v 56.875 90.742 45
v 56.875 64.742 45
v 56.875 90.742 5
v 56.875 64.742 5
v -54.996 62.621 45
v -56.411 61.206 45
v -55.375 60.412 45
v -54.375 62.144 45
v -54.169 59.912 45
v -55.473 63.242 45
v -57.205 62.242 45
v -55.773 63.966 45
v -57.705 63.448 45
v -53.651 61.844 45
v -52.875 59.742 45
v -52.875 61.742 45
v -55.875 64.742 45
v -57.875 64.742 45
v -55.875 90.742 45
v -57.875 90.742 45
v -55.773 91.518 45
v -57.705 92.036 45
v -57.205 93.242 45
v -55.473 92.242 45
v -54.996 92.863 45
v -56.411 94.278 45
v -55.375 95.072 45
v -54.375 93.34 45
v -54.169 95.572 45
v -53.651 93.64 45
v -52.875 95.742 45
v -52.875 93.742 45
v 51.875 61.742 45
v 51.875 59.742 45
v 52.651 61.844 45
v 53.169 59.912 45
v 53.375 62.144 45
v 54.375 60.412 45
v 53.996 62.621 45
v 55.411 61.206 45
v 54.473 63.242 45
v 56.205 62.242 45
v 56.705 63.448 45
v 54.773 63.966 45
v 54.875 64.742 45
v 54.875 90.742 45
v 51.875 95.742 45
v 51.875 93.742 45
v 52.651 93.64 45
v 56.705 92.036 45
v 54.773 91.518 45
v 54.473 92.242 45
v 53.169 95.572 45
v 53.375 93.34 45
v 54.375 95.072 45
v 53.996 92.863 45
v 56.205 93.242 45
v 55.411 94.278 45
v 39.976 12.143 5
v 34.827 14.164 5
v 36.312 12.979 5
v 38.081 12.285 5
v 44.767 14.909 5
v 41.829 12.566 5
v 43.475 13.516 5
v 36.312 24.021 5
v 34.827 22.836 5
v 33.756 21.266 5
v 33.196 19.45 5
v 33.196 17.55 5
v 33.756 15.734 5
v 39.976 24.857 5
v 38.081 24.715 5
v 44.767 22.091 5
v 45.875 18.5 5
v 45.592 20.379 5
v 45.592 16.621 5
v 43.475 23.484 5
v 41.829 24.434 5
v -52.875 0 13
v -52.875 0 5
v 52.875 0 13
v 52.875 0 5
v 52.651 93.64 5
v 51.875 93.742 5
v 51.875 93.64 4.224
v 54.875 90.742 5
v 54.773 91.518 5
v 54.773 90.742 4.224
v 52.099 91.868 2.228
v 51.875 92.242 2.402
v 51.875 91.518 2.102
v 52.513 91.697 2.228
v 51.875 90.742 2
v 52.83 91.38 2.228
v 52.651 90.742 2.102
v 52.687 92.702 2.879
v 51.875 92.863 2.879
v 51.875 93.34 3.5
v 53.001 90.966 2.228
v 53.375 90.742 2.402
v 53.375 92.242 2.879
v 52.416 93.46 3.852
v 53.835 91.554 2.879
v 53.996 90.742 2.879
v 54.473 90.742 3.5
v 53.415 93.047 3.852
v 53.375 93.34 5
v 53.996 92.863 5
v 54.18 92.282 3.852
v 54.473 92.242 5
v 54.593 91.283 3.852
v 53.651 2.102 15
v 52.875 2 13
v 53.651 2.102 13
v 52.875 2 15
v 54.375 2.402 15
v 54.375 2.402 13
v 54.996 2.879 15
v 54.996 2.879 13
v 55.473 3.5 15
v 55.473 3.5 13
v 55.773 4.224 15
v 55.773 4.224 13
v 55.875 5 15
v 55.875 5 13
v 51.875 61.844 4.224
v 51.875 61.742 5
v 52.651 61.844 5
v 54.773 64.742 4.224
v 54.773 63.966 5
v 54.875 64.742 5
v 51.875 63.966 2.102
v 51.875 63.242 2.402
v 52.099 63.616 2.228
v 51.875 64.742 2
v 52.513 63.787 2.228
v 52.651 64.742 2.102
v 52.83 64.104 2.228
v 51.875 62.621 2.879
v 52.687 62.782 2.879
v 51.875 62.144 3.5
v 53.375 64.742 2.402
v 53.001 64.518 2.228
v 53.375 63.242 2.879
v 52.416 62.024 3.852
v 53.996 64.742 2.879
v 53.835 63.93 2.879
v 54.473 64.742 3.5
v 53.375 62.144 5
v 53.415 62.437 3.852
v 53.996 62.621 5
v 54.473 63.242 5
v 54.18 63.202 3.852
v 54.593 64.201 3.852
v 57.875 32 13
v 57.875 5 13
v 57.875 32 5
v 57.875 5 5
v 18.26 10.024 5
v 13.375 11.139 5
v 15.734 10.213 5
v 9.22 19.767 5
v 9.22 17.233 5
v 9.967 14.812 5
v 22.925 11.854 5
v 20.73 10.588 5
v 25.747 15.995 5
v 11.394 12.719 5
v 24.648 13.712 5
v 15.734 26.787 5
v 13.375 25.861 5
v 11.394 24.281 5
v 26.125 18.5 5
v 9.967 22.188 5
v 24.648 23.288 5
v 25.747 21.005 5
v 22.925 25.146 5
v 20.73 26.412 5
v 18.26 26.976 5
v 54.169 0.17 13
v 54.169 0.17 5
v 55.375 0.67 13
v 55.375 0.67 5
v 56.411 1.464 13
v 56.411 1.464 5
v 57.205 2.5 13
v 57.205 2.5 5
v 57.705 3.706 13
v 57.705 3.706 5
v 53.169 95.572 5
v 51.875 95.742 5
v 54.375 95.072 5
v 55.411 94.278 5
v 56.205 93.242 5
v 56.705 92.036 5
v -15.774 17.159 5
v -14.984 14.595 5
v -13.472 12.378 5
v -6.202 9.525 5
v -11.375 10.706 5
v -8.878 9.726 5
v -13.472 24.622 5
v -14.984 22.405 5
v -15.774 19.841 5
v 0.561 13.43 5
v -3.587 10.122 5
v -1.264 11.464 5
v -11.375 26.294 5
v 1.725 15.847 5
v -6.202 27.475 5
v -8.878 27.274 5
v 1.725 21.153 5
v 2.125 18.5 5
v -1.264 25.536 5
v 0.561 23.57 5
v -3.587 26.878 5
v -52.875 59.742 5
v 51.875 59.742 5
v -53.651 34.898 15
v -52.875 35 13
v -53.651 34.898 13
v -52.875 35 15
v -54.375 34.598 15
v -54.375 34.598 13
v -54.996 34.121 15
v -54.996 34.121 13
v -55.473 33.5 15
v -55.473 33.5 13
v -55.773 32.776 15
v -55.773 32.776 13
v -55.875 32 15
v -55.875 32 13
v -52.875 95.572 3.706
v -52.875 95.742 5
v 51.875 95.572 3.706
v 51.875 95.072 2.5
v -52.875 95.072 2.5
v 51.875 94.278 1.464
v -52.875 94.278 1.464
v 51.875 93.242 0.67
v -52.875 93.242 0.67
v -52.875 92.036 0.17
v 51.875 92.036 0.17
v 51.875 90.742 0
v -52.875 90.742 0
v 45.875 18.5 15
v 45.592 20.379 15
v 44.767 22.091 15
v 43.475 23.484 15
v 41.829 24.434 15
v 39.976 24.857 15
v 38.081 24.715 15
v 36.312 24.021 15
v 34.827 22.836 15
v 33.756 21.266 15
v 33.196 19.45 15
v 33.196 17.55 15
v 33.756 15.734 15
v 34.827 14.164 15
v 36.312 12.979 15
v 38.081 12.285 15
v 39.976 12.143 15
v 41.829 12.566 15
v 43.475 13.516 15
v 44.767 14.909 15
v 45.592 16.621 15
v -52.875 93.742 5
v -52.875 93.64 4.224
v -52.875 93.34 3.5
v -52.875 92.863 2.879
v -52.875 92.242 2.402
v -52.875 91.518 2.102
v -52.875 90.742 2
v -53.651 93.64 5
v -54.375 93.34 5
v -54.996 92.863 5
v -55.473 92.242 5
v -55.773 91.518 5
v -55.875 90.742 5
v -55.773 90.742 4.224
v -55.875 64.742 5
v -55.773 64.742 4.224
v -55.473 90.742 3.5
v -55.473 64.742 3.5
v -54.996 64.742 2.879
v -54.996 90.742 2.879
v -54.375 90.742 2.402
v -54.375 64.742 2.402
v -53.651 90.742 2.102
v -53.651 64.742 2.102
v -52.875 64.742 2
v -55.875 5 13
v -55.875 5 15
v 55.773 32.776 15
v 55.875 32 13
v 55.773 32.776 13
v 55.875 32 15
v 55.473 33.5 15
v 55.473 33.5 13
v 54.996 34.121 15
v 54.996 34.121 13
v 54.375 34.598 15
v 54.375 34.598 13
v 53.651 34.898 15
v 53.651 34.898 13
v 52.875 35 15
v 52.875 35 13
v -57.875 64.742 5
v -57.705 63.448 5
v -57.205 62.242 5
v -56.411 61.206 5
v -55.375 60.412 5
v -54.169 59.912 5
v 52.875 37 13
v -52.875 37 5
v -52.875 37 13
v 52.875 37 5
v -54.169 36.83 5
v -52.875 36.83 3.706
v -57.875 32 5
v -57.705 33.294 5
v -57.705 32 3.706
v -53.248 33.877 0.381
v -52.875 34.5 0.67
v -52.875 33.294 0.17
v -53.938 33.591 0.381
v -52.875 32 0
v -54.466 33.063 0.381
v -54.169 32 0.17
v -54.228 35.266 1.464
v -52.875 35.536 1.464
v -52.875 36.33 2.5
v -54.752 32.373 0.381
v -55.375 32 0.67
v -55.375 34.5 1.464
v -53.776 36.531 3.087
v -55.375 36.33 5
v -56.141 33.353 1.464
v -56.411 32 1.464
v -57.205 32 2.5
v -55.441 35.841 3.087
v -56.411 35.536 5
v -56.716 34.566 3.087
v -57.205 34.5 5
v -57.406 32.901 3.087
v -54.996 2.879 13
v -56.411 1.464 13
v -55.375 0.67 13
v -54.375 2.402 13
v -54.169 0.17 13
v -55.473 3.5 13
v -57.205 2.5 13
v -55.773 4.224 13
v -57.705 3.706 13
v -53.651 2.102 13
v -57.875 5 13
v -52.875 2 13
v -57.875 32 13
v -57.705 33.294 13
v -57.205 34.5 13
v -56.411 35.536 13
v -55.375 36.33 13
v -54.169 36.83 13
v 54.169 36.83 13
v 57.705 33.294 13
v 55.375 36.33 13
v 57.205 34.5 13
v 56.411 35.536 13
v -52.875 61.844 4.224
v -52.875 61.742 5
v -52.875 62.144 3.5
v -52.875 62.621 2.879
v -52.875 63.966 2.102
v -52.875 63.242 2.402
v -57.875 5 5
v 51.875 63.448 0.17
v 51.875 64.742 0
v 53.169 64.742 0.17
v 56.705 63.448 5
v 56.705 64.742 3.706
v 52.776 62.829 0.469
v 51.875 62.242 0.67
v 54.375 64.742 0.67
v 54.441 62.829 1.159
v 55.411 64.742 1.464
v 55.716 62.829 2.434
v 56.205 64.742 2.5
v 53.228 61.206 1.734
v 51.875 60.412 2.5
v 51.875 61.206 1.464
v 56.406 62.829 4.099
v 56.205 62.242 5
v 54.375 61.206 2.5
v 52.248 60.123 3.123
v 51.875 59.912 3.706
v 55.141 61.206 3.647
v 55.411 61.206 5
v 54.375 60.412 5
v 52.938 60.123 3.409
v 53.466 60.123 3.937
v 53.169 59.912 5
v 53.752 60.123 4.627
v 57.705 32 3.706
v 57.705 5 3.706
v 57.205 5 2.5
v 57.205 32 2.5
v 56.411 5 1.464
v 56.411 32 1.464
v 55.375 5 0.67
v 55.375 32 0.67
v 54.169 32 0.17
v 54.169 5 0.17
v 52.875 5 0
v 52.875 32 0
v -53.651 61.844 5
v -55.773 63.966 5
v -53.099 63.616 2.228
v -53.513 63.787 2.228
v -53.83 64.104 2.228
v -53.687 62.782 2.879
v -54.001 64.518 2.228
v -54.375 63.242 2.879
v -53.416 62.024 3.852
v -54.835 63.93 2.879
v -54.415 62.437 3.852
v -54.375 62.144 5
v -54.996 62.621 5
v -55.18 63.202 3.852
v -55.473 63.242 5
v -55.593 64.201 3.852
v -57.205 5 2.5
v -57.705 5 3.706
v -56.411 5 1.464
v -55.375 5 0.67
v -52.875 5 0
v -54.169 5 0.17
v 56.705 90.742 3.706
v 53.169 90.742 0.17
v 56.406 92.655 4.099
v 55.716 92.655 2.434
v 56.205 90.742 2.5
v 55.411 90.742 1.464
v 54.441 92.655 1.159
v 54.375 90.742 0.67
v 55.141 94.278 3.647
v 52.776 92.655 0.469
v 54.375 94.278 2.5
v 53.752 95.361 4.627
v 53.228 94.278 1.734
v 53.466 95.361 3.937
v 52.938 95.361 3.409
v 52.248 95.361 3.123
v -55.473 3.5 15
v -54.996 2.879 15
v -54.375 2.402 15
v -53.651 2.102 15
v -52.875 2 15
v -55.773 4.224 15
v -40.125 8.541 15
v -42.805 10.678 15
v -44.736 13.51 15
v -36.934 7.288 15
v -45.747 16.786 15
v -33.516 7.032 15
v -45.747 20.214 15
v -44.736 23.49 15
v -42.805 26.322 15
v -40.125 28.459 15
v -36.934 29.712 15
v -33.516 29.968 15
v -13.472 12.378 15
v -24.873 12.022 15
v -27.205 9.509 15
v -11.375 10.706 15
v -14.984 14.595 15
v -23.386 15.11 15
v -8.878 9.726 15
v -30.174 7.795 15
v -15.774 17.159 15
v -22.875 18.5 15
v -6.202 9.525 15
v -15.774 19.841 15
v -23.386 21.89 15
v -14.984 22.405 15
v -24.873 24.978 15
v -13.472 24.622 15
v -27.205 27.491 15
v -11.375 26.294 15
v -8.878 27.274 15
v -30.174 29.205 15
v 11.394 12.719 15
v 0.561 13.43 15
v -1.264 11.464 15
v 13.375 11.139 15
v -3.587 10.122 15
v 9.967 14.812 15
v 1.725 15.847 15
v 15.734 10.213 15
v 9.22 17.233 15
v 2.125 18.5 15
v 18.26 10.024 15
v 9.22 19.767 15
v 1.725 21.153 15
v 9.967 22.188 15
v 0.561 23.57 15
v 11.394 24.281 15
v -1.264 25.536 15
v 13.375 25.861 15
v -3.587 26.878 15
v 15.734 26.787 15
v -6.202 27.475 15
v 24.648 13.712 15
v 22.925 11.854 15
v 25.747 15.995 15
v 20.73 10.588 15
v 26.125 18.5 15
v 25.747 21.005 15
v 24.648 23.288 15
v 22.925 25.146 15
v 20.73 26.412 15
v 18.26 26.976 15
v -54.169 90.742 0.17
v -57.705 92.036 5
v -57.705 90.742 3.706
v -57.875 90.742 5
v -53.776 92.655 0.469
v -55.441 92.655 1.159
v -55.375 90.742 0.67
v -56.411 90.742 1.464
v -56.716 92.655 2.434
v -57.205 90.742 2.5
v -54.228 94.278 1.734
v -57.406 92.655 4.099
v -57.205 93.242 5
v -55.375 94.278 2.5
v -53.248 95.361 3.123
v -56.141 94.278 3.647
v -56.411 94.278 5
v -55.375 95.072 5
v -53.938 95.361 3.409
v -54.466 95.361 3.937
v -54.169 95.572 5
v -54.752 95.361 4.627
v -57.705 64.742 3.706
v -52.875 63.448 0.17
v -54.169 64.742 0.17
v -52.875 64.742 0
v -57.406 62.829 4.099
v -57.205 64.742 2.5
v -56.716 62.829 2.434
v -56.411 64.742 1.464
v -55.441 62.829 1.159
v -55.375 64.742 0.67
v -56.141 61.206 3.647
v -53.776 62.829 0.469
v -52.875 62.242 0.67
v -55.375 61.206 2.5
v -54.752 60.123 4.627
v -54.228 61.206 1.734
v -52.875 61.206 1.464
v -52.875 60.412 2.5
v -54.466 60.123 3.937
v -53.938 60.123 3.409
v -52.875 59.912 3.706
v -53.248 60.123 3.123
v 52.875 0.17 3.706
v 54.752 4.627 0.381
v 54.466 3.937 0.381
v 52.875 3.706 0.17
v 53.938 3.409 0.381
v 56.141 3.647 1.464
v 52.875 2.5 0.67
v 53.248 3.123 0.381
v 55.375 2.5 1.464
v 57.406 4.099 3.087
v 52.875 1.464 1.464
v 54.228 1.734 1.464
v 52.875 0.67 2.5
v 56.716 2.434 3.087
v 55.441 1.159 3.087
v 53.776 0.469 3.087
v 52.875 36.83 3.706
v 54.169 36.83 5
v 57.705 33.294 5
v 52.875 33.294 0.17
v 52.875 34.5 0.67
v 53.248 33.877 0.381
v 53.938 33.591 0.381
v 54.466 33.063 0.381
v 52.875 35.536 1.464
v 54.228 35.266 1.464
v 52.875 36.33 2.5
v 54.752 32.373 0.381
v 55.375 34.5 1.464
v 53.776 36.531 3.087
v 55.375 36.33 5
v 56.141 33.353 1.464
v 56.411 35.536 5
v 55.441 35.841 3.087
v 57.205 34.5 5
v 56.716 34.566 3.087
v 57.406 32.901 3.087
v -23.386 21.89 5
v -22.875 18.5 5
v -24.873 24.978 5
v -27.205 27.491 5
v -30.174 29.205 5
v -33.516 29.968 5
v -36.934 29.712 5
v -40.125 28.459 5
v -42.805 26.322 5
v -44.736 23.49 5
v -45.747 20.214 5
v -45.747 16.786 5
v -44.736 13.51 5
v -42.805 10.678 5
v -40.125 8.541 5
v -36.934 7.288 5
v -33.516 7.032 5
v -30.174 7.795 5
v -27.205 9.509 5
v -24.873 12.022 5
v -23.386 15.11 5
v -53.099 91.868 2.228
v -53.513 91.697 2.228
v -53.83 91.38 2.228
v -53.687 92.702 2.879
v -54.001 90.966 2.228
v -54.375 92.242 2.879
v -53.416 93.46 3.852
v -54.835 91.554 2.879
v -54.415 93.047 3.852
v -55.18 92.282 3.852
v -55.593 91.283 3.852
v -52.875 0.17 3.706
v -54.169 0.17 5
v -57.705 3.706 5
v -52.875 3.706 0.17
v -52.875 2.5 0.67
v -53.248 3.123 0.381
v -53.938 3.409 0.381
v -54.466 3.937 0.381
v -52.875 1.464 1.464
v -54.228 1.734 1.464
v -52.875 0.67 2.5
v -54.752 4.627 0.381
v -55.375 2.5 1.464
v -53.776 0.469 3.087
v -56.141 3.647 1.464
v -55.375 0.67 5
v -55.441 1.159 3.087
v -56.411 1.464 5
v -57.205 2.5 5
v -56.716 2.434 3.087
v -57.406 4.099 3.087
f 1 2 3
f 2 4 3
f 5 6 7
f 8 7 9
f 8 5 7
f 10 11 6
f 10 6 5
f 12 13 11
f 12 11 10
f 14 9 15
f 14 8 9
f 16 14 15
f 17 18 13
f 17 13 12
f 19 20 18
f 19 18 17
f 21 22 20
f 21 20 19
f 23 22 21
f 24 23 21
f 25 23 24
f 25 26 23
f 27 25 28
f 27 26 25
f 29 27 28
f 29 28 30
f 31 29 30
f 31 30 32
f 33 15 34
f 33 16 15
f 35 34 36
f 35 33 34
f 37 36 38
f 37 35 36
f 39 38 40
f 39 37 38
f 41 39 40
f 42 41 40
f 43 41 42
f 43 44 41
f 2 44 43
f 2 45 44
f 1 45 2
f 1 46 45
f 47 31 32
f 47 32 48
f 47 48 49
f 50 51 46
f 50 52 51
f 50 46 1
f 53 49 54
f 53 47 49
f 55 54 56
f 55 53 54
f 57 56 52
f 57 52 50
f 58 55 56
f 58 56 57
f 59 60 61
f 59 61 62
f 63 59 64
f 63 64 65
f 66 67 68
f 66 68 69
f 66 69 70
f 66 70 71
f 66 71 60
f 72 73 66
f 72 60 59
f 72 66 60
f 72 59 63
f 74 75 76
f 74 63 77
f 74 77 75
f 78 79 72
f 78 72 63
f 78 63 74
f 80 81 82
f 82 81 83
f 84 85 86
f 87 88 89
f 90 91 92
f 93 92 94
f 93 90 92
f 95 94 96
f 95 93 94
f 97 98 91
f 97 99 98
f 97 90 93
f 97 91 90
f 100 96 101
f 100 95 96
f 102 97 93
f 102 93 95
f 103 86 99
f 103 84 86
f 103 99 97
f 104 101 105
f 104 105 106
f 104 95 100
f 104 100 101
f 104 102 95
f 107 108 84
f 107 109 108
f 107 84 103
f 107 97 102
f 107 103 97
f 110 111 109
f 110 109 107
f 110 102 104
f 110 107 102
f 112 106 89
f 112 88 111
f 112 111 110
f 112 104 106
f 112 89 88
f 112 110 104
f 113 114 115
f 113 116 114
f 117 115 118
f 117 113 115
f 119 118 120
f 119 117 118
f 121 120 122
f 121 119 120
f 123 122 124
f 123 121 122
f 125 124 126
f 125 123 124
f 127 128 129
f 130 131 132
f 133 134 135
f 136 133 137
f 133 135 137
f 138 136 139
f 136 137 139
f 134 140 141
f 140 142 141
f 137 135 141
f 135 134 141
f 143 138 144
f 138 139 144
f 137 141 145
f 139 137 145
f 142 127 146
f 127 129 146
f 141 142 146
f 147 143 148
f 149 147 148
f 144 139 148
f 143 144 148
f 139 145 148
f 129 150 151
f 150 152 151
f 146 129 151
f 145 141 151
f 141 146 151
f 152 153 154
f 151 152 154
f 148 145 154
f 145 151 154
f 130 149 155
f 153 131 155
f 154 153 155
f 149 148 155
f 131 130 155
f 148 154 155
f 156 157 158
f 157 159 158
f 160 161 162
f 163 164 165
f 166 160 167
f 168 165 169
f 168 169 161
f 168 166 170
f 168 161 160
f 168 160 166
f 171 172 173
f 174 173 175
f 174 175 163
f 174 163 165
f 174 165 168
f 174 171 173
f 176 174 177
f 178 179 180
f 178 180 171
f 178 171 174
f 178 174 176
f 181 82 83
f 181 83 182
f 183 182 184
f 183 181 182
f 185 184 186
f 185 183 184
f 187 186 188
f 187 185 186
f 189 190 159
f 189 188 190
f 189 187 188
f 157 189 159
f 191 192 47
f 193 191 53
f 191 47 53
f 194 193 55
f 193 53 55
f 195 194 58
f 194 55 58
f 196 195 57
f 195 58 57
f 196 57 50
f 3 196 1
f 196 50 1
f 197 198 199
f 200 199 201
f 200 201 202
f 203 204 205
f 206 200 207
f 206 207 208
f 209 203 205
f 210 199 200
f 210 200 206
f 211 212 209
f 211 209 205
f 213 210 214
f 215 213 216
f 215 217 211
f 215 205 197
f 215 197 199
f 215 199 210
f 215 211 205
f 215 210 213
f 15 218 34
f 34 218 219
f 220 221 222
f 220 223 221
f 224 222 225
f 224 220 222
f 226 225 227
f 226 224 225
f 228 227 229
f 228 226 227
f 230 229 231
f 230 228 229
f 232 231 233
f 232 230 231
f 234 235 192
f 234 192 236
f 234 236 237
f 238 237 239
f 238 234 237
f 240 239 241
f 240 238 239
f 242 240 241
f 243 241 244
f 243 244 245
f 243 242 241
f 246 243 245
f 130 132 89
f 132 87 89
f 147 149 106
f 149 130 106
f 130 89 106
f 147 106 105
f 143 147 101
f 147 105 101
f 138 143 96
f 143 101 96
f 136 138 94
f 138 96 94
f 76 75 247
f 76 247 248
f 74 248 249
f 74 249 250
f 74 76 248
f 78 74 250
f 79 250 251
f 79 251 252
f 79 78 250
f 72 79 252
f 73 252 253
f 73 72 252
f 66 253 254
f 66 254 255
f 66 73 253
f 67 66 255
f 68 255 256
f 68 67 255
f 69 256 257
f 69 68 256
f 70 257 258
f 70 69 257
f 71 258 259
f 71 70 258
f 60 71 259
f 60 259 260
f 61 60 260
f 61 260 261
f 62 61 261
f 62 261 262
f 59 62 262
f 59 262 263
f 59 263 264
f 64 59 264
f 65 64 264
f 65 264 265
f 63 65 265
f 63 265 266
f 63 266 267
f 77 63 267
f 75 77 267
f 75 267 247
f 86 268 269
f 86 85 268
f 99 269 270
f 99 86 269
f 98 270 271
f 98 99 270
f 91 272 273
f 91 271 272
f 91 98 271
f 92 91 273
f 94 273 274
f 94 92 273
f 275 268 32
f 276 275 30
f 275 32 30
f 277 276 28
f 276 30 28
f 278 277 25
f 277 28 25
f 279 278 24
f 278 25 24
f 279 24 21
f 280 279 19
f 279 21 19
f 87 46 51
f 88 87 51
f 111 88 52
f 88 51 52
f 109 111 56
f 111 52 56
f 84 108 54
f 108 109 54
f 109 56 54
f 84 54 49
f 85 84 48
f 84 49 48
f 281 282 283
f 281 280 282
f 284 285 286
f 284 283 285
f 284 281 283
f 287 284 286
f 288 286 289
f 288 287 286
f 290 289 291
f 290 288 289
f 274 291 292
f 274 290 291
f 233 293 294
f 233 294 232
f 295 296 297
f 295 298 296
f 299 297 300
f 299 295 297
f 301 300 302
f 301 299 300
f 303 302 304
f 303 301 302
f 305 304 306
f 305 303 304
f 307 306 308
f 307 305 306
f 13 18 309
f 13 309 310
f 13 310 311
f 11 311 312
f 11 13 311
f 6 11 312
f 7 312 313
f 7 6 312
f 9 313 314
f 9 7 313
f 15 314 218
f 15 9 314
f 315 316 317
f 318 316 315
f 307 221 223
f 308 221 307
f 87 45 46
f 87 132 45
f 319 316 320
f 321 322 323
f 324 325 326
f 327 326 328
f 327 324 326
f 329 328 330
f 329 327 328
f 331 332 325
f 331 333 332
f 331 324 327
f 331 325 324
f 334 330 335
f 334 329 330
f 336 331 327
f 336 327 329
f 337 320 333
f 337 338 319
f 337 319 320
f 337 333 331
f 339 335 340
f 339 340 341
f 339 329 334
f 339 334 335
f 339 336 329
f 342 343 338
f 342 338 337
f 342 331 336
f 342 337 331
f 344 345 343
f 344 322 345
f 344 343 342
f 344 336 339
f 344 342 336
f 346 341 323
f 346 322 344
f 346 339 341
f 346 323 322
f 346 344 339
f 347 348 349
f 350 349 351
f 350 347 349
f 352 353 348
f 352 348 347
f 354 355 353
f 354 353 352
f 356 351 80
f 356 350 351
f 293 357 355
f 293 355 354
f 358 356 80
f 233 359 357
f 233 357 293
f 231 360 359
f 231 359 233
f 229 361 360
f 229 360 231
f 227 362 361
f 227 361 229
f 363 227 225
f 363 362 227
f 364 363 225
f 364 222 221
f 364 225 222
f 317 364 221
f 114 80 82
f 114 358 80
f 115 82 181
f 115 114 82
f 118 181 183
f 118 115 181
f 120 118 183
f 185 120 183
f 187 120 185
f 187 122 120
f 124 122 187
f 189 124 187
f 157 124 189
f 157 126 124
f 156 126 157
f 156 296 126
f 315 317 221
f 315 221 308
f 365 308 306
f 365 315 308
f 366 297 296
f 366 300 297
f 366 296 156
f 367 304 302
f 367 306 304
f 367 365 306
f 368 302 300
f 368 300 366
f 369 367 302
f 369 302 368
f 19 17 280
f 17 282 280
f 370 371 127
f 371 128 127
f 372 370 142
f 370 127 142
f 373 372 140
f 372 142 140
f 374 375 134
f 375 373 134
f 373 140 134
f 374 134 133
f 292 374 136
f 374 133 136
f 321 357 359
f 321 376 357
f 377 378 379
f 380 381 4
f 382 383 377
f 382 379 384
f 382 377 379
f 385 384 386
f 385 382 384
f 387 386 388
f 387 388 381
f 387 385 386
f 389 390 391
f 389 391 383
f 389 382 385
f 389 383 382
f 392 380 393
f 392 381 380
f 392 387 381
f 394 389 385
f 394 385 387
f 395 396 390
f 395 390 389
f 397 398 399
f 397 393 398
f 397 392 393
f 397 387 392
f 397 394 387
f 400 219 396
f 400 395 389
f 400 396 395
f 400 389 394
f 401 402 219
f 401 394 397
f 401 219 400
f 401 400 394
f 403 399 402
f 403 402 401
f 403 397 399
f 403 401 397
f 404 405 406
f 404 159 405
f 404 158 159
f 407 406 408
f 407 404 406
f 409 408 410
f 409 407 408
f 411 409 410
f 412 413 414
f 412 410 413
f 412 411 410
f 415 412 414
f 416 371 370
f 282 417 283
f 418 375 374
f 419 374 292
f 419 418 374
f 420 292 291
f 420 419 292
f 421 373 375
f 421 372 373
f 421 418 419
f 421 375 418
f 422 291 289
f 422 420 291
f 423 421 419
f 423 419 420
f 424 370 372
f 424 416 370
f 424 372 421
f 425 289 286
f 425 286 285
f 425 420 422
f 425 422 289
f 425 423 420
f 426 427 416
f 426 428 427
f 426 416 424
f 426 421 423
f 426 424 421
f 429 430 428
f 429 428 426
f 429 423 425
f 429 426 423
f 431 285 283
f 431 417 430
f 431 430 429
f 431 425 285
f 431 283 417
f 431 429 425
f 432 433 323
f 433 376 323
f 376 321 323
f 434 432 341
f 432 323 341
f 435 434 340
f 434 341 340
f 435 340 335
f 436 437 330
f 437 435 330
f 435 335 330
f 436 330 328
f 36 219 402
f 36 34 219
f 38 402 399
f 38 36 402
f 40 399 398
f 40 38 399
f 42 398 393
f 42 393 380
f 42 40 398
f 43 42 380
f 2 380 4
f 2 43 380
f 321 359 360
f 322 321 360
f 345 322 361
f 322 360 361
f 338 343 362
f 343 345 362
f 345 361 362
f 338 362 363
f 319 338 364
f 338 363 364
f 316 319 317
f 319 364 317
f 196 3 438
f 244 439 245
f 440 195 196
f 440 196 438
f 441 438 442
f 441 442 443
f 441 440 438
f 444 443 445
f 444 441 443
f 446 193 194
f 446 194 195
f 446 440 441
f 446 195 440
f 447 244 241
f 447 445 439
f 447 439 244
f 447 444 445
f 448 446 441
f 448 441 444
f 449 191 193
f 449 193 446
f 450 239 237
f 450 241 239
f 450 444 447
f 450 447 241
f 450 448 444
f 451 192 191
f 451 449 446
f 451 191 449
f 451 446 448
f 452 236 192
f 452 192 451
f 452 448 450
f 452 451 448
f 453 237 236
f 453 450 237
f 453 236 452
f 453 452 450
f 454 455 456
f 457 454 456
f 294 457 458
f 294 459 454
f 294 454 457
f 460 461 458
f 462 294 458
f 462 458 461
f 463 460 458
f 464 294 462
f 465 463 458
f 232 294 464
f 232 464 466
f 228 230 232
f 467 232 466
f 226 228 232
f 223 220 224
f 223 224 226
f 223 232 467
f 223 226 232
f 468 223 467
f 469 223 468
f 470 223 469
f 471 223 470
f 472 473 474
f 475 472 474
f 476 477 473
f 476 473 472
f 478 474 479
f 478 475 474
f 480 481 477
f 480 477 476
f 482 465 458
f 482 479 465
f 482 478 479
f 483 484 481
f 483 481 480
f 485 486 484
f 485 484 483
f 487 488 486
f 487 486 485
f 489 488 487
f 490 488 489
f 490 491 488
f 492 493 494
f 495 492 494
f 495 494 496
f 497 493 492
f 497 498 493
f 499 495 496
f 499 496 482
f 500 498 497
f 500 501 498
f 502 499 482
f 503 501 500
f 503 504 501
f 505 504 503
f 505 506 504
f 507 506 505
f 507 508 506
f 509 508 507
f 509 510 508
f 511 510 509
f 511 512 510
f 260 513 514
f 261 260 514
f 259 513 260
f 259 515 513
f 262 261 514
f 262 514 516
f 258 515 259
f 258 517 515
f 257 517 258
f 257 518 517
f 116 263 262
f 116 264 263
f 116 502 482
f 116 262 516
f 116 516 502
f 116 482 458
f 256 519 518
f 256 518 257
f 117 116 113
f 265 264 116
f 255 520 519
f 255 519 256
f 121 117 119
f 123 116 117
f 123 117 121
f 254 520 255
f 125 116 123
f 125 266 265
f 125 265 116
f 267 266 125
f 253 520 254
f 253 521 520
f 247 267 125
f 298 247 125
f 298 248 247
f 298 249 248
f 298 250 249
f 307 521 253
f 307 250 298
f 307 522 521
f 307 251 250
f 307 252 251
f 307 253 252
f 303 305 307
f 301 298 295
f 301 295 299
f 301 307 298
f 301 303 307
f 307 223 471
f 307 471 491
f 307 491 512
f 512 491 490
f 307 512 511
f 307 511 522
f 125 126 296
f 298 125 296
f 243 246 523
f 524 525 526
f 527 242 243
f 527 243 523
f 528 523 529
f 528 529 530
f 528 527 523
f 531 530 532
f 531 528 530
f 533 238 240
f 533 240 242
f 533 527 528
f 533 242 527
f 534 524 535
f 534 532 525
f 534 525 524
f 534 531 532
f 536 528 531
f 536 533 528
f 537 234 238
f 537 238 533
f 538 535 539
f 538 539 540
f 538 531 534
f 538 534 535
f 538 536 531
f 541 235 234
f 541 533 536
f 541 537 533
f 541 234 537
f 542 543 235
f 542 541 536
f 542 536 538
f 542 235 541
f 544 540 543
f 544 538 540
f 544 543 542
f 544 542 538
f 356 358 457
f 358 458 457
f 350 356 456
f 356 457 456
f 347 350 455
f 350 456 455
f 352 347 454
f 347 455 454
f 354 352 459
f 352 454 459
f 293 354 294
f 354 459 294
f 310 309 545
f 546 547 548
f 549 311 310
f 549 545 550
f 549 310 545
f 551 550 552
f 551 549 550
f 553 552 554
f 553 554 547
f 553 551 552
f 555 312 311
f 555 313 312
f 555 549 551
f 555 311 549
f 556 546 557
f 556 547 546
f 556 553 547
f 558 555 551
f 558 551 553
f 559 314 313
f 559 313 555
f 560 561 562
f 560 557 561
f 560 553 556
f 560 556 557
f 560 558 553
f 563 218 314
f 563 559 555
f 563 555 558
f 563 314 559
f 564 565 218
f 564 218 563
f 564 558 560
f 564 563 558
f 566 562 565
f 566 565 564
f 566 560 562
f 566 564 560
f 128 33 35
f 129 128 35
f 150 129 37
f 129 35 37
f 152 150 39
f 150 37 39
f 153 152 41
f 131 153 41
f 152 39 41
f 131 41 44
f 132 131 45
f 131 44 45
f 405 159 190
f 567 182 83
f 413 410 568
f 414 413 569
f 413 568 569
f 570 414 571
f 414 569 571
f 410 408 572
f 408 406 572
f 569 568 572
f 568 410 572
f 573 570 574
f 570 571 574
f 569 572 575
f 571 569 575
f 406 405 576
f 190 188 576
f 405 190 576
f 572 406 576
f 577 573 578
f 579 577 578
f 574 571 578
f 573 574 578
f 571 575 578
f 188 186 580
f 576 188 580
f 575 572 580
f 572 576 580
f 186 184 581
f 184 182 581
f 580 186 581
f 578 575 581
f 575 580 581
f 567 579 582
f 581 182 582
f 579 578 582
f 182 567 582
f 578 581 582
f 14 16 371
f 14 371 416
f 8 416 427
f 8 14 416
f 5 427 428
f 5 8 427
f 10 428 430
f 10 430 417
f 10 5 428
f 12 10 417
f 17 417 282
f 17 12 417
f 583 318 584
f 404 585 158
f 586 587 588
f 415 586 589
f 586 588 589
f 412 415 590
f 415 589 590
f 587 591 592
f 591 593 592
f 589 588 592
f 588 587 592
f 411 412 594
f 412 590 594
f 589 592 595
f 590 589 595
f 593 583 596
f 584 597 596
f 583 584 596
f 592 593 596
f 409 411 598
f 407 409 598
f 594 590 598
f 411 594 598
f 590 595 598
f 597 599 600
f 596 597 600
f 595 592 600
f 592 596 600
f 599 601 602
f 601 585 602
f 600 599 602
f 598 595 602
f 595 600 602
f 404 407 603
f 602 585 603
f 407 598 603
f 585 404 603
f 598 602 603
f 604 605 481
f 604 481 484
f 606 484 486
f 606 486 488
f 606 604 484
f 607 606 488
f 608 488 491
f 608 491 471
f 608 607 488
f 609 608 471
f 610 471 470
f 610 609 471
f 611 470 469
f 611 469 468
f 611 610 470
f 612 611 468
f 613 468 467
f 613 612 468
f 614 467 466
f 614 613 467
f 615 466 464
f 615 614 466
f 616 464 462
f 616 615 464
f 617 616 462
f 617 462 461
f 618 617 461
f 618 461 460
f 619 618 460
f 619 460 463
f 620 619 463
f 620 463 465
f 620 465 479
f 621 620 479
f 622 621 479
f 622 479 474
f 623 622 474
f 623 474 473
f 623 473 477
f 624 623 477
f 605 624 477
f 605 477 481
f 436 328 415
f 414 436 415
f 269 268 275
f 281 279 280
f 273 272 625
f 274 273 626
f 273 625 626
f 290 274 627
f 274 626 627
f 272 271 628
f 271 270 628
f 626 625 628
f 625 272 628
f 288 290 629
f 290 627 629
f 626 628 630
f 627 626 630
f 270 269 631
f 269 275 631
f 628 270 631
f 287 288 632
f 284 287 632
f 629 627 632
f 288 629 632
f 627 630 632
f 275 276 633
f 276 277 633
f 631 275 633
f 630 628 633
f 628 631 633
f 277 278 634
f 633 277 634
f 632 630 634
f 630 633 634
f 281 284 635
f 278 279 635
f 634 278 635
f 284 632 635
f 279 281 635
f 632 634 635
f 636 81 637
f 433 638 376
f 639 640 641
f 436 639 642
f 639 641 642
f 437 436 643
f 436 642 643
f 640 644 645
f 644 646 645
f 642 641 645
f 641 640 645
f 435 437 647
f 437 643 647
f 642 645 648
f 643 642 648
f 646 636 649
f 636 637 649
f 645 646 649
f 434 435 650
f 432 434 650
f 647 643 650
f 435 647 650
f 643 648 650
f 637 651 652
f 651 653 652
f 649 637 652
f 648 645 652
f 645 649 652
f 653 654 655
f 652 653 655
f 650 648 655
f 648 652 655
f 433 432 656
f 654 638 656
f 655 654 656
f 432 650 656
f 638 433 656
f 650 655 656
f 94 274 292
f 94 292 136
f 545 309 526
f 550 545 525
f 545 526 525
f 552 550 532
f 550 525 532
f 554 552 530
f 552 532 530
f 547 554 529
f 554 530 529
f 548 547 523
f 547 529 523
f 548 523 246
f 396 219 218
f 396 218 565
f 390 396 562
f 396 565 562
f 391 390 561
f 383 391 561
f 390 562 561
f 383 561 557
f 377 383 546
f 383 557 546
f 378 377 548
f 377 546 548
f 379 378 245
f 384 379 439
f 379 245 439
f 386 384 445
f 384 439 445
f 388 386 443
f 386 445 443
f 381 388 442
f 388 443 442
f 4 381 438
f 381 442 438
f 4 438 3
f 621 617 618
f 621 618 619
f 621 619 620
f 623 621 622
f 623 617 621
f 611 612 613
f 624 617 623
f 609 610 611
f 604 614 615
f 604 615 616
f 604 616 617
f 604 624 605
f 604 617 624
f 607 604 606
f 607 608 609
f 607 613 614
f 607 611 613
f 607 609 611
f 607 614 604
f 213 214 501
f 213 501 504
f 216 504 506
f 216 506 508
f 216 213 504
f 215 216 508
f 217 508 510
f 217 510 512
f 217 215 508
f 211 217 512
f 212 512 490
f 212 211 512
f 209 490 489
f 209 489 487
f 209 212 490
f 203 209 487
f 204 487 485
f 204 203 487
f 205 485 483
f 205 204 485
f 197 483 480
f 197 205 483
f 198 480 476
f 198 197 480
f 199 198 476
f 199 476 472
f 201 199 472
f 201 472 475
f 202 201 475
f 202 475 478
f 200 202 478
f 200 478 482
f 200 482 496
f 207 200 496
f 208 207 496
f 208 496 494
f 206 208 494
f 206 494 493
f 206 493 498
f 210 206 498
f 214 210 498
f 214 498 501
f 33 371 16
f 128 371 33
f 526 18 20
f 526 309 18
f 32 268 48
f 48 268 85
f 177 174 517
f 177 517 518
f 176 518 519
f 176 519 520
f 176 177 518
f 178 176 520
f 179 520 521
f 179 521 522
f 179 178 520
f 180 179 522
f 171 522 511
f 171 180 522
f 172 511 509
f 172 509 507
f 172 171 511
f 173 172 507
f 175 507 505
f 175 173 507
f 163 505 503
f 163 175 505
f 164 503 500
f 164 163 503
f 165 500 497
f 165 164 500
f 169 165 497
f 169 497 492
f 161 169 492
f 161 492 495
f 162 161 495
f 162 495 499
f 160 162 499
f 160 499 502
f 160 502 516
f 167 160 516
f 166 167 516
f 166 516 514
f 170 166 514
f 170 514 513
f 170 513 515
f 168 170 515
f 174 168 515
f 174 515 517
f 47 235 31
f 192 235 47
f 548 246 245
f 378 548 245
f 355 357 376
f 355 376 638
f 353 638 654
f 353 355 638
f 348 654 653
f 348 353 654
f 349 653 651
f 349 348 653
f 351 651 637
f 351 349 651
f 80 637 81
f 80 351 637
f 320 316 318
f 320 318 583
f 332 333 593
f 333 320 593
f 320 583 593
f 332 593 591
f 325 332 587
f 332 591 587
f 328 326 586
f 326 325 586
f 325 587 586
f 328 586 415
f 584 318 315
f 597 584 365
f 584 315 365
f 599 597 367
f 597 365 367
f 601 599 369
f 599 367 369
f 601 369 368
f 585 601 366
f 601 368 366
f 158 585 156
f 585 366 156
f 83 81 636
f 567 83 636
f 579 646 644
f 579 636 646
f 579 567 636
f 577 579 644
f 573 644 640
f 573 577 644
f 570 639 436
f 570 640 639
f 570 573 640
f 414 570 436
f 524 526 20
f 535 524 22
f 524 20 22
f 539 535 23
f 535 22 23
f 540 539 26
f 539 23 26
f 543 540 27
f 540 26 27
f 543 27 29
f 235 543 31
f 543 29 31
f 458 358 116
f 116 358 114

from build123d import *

# Parameters (mm, degrees)
F0_R          = 11.5
F1_DEPTH      = 5
F0_R_2        = 9
F0_R_3        = 8.5
F0_R_4        = 6.375
F0_W          = 115.75
F0_H          = 37
F0_W_2        = 111.75
F0_H_2        = 33
F2_DEPTH      = 13
F3_DEPTH      = 15
F4_W          = 110.75
F4_H          = 32
F5_DEPTH      = 2
F4_W_2        = 114.75
F4_H_2        = 36
F6_DEPTH      = 45
F7_R          = 5
F7_2_R        = 5
F8_R          = 3
F8_2_R        = 3
F10_T1_DEPTH  = 104.75
F10_S5_W      = 5
F10_S5_H      = 5
F10_T6_DEPTH  = 5
F10_S11_W     = 5
F10_S11_H     = 5
F10_T12_DEPTH = 5
F10_S17_W     = 5
F10_S17_H     = 5
F10_T18_DEPTH = 5
F10_S23_W     = 5
F10_S23_H     = 5
F10_T24_DEPTH = 5


# Not quite as in the source:
# - a fillet or chamfer that OpenCascade refuses, or shapes differently, is made with other operations: its cross-section is extruded or revolved along the edge and cut away or added


with BuildPart() as f1:
    # F0 (on Top) → F1 (new body)
    with BuildSketch(Plane.XY):
        with Locations((-34.375, 18.5)):
            Circle(F0_R)
    extrude(amount=F1_DEPTH)



with BuildPart() as f1b:
    # F0 (on Top) → F1, piece 2 (new body)
    with BuildSketch(Plane.XY):
        with Locations((-6.875, 18.5)):
            Circle(F0_R_2)
    extrude(amount=F1_DEPTH)


with BuildPart() as f1c:
    # F0 (on Top) → F1, piece 3 (new body)
    with BuildSketch(Plane.XY):
        with Locations((17.625, 18.5)):
            Circle(F0_R_3)
    extrude(amount=F1_DEPTH)


with BuildPart() as f1d:
    # F0 (on Top) → F1, piece 4 (new body)
    with BuildSketch(Plane.XY):
        with Locations((39.5, 18.5)):
            Circle(F0_R_4)
    extrude(amount=F1_DEPTH)


with BuildPart() as f2:
    # F0 (on Top) → F2 (new body)
    with BuildSketch(Plane.XY):
        with Locations((0, 18.5)):
            Rectangle(F0_W, F0_H)
        with Locations((0, 18.5)):
            Rectangle(F0_W_2, F0_H_2, mode=Mode.SUBTRACT)
    extrude(amount=F2_DEPTH)


with BuildPart() as f1_1:
    add(f1.part)

    add(f1b.part)  # F3 merges F1b

    add(f1c.part)  # F3 merges F1c

    add(f1d.part)  # F3 merges F1d

    add(f2.part)  # F3 merges F2
    # F0 (on Top) → F3 (join)
    with BuildSketch(Plane.XY):
        with Locations((0, 18.5)):
            Rectangle(F0_W_2, F0_H_2)
        with Locations((-34.375, 18.5)):
            Circle(F0_R, mode=Mode.SUBTRACT)
        with Locations((-6.875, 18.5)):
            Circle(F0_R_2, mode=Mode.SUBTRACT)
        with Locations((17.625, 18.5)):
            Circle(F0_R_3, mode=Mode.SUBTRACT)
        with Locations((39.5, 18.5)):
            Circle(F0_R_4, mode=Mode.SUBTRACT)
    extrude(amount=F3_DEPTH)

    # F7
    f7_edges = [f1_1.edges().sort_by_distance(p)[0] for p in [
        (-57.875, 37, 6.5),
        (-57.875, 0, 6.5),
        (57.875, 0, 6.5),
        (57.875, 37, 6.5),
        (0, 37, 0),
        (57.875, 18.5, 0),
        (0, 0, 0),
        (-57.875, 18.5, 0),
    ]]
    fillet(f7_edges, radius=F7_R)

    # F8
    f8_edges = [f1_1.edges().sort_by_distance(p)[0] for p in [
        (55.875, 35, 14),
        (55.875, 2, 14),
        (-55.875, 35, 14),
        (-55.875, 2, 14),
    ]]
    fillet(f8_edges, radius=F8_R)


with BuildPart() as f5:
    # F4 (on Top) → F5 (new body)
    with BuildSketch(Plane.XY):
        with Locations((-0.5, -22.2580123227)):
            Rectangle(F4_W, F4_H)
    extrude(amount=F5_DEPTH)

    # F4 (on Top) → F6 (join)
    with BuildSketch(Plane.XY):
        with Locations((-0.5, -22.2580123227)):
            Rectangle(F4_W_2, F4_H_2)
        with Locations((-0.5, -22.2580123227)):
            Rectangle(F4_W, F4_H, mode=Mode.SUBTRACT)
    extrude(amount=F6_DEPTH)

    # F7#2
    f7_2_edges = [f5.edges().sort_by_distance(p)[0] for p in [
        (56.875, -4.258012, 22.5),
        (56.875, -40.258012, 22.5),
        (-57.875, -4.258012, 22.5),
        (-57.875, -40.258012, 22.5),
        (-57.875, -22.258012, 0),
        (56.875, -22.258012, 0),
    ]]
    fillet(f7_2_edges, radius=F7_2_R)

    # F8#2
    f8_2_edges = [f5.edges().sort_by_distance(p)[0] for p in [
        (-55.875, -38.258012, 23.5),
        (-55.875, -6.258012, 23.5),
        (54.875, -38.258012, 23.5),
        (54.875, -6.258012, 23.5),
        (-0.5, -6.258012, 2),
        (-0.5, -38.258012, 2),
        (-55.875, -22.258012, 2),
        (54.875, -22.258012, 2),
    ]]
    fillet(f8_2_edges, radius=F8_2_R)


with BuildPart() as f5_1:
    # F9: moved
    add(f5.part.moved(Location((0, 100, 0))))

    # F10: fillet of radius 5 on 2 edges, made by hand

    # F10_s2 → F10_t1 (cut)
    with BuildSketch(Plane.YZ.offset(-52.875)):
        with BuildLine():
            ThreePointArc((95.7419876773, 5), (94.2775215832, 1.4644660941), (90.7419876773, 0))
            Line((90.7419876773, 0), (95.7419876773, 0))
            Line((95.7419876773, 0), (95.7419876773, 5))
        make_face()
        with BuildLine():
            ThreePointArc((59.7419876773, 5), (61.2064537714, 1.4644660941), (64.7419876773, 0))
            Line((64.7419876773, 0), (59.7419876773, 0))
            Line((59.7419876773, 0), (59.7419876773, 5))
        make_face()
    extrude(amount=F10_T1_DEPTH, mode=Mode.SUBTRACT)


with BuildPart() as f10_tool4:
    # F10_s5 → F10_t6 (new body)
    with BuildSketch(Plane.XZ.offset(-64.7419876773)):
        with Locations((-55.375, 2.5)):
            Rectangle(F10_S5_W, F10_S5_H)
    extrude(amount=F10_T6_DEPTH)

    # F10_s7 → F10_t8 (revolve, cut)
    with BuildSketch(Plane(origin=(-52.875, 64.7419876773, 5), x_dir=(0.7071067812, 0, 0.7071067812), z_dir=(0.7071067812, 0, -0.7071067812))):
        with BuildLine():
            ThreePointArc((0, -5), (5, 0), (0, 5))
            Line((0, 5), (0, -5))
        make_face()
    revolve(axis=Axis((-52.875, 64.7419876773, 5), (0, -1, 0)), mode=Mode.SUBTRACT)


with BuildPart() as f5_2:
    add(f5_1.part)

    # F10_t3: cut F10_tool4
    add(f10_tool4.part, mode=Mode.SUBTRACT)


with BuildPart() as f10_tool10:
    # F10_s11 → F10_t12 (new body)
    with BuildSketch(Plane.XZ.offset(-64.7419876773)):
        with Locations((54.375, 2.5)):
            Rectangle(F10_S11_W, F10_S11_H)
    extrude(amount=F10_T12_DEPTH)

    # F10_s13 → F10_t14 (revolve, cut)
    with BuildSketch(Plane(origin=(51.875, 64.7419876773, 5), x_dir=(-0.7071067812, 0, 0.7071067812), z_dir=(0.7071067812, 0, 0.7071067812))):
        with BuildLine():
            ThreePointArc((0, -5), (5, 0), (0, 5))
            Line((0, 5), (0, -5))
        make_face()
    revolve(axis=Axis((51.875, 64.7419876773, 5), (0, -1, 0)), mode=Mode.SUBTRACT)


with BuildPart() as f5_3:
    add(f5_2.part)

    # F10_t9: cut F10_tool10
    add(f10_tool10.part, mode=Mode.SUBTRACT)


with BuildPart() as f10_tool16:
    # F10_s17 → F10_t18 (new body)
    with BuildSketch(Plane.XZ.offset(-90.7419876773)):
        with Locations((54.375, 2.5)):
            Rectangle(F10_S17_W, F10_S17_H)
    extrude(amount=-F10_T18_DEPTH)

    # F10_s19 → F10_t20 (revolve, cut)
    with BuildSketch(Plane(origin=(51.875, 90.7419876773, 5), x_dir=(-0.7071067812, 0, 0.7071067812), z_dir=(-0.7071067812, 0, -0.7071067812))):
        with BuildLine():
            ThreePointArc((0, -5), (5, 0), (0, 5))
            Line((0, 5), (0, -5))
        make_face()
    revolve(axis=Axis((51.875, 90.7419876773, 5), (0, 1, 0)), mode=Mode.SUBTRACT)


with BuildPart() as f5_4:
    add(f5_3.part)

    # F10_t15: cut F10_tool16
    add(f10_tool16.part, mode=Mode.SUBTRACT)


with BuildPart() as f10_tool22:
    # F10_s23 → F10_t24 (new body)
    with BuildSketch(Plane.XZ.offset(-90.7419876773)):
        with Locations((-55.375, 2.5)):
            Rectangle(F10_S23_W, F10_S23_H)
    extrude(amount=-F10_T24_DEPTH)

    # F10_s25 → F10_t26 (revolve, cut)
    with BuildSketch(Plane(origin=(-52.875, 90.7419876773, 5), x_dir=(0.7071067812, 0, 0.7071067812), z_dir=(-0.7071067812, 0, 0.7071067812))):
        with BuildLine():
            ThreePointArc((0, -5), (5, 0), (0, 5))
            Line((0, 5), (0, -5))
        make_face()
    revolve(axis=Axis((-52.875, 90.7419876773, 5), (0, 1, 0)), mode=Mode.SUBTRACT)


with BuildPart() as f5_5:
    add(f5_4.part)

    # F10_t21: cut F10_tool22
    add(f10_tool22.part, mode=Mode.SUBTRACT)


solid = Compound([f1_1.part, f5_5.part])
